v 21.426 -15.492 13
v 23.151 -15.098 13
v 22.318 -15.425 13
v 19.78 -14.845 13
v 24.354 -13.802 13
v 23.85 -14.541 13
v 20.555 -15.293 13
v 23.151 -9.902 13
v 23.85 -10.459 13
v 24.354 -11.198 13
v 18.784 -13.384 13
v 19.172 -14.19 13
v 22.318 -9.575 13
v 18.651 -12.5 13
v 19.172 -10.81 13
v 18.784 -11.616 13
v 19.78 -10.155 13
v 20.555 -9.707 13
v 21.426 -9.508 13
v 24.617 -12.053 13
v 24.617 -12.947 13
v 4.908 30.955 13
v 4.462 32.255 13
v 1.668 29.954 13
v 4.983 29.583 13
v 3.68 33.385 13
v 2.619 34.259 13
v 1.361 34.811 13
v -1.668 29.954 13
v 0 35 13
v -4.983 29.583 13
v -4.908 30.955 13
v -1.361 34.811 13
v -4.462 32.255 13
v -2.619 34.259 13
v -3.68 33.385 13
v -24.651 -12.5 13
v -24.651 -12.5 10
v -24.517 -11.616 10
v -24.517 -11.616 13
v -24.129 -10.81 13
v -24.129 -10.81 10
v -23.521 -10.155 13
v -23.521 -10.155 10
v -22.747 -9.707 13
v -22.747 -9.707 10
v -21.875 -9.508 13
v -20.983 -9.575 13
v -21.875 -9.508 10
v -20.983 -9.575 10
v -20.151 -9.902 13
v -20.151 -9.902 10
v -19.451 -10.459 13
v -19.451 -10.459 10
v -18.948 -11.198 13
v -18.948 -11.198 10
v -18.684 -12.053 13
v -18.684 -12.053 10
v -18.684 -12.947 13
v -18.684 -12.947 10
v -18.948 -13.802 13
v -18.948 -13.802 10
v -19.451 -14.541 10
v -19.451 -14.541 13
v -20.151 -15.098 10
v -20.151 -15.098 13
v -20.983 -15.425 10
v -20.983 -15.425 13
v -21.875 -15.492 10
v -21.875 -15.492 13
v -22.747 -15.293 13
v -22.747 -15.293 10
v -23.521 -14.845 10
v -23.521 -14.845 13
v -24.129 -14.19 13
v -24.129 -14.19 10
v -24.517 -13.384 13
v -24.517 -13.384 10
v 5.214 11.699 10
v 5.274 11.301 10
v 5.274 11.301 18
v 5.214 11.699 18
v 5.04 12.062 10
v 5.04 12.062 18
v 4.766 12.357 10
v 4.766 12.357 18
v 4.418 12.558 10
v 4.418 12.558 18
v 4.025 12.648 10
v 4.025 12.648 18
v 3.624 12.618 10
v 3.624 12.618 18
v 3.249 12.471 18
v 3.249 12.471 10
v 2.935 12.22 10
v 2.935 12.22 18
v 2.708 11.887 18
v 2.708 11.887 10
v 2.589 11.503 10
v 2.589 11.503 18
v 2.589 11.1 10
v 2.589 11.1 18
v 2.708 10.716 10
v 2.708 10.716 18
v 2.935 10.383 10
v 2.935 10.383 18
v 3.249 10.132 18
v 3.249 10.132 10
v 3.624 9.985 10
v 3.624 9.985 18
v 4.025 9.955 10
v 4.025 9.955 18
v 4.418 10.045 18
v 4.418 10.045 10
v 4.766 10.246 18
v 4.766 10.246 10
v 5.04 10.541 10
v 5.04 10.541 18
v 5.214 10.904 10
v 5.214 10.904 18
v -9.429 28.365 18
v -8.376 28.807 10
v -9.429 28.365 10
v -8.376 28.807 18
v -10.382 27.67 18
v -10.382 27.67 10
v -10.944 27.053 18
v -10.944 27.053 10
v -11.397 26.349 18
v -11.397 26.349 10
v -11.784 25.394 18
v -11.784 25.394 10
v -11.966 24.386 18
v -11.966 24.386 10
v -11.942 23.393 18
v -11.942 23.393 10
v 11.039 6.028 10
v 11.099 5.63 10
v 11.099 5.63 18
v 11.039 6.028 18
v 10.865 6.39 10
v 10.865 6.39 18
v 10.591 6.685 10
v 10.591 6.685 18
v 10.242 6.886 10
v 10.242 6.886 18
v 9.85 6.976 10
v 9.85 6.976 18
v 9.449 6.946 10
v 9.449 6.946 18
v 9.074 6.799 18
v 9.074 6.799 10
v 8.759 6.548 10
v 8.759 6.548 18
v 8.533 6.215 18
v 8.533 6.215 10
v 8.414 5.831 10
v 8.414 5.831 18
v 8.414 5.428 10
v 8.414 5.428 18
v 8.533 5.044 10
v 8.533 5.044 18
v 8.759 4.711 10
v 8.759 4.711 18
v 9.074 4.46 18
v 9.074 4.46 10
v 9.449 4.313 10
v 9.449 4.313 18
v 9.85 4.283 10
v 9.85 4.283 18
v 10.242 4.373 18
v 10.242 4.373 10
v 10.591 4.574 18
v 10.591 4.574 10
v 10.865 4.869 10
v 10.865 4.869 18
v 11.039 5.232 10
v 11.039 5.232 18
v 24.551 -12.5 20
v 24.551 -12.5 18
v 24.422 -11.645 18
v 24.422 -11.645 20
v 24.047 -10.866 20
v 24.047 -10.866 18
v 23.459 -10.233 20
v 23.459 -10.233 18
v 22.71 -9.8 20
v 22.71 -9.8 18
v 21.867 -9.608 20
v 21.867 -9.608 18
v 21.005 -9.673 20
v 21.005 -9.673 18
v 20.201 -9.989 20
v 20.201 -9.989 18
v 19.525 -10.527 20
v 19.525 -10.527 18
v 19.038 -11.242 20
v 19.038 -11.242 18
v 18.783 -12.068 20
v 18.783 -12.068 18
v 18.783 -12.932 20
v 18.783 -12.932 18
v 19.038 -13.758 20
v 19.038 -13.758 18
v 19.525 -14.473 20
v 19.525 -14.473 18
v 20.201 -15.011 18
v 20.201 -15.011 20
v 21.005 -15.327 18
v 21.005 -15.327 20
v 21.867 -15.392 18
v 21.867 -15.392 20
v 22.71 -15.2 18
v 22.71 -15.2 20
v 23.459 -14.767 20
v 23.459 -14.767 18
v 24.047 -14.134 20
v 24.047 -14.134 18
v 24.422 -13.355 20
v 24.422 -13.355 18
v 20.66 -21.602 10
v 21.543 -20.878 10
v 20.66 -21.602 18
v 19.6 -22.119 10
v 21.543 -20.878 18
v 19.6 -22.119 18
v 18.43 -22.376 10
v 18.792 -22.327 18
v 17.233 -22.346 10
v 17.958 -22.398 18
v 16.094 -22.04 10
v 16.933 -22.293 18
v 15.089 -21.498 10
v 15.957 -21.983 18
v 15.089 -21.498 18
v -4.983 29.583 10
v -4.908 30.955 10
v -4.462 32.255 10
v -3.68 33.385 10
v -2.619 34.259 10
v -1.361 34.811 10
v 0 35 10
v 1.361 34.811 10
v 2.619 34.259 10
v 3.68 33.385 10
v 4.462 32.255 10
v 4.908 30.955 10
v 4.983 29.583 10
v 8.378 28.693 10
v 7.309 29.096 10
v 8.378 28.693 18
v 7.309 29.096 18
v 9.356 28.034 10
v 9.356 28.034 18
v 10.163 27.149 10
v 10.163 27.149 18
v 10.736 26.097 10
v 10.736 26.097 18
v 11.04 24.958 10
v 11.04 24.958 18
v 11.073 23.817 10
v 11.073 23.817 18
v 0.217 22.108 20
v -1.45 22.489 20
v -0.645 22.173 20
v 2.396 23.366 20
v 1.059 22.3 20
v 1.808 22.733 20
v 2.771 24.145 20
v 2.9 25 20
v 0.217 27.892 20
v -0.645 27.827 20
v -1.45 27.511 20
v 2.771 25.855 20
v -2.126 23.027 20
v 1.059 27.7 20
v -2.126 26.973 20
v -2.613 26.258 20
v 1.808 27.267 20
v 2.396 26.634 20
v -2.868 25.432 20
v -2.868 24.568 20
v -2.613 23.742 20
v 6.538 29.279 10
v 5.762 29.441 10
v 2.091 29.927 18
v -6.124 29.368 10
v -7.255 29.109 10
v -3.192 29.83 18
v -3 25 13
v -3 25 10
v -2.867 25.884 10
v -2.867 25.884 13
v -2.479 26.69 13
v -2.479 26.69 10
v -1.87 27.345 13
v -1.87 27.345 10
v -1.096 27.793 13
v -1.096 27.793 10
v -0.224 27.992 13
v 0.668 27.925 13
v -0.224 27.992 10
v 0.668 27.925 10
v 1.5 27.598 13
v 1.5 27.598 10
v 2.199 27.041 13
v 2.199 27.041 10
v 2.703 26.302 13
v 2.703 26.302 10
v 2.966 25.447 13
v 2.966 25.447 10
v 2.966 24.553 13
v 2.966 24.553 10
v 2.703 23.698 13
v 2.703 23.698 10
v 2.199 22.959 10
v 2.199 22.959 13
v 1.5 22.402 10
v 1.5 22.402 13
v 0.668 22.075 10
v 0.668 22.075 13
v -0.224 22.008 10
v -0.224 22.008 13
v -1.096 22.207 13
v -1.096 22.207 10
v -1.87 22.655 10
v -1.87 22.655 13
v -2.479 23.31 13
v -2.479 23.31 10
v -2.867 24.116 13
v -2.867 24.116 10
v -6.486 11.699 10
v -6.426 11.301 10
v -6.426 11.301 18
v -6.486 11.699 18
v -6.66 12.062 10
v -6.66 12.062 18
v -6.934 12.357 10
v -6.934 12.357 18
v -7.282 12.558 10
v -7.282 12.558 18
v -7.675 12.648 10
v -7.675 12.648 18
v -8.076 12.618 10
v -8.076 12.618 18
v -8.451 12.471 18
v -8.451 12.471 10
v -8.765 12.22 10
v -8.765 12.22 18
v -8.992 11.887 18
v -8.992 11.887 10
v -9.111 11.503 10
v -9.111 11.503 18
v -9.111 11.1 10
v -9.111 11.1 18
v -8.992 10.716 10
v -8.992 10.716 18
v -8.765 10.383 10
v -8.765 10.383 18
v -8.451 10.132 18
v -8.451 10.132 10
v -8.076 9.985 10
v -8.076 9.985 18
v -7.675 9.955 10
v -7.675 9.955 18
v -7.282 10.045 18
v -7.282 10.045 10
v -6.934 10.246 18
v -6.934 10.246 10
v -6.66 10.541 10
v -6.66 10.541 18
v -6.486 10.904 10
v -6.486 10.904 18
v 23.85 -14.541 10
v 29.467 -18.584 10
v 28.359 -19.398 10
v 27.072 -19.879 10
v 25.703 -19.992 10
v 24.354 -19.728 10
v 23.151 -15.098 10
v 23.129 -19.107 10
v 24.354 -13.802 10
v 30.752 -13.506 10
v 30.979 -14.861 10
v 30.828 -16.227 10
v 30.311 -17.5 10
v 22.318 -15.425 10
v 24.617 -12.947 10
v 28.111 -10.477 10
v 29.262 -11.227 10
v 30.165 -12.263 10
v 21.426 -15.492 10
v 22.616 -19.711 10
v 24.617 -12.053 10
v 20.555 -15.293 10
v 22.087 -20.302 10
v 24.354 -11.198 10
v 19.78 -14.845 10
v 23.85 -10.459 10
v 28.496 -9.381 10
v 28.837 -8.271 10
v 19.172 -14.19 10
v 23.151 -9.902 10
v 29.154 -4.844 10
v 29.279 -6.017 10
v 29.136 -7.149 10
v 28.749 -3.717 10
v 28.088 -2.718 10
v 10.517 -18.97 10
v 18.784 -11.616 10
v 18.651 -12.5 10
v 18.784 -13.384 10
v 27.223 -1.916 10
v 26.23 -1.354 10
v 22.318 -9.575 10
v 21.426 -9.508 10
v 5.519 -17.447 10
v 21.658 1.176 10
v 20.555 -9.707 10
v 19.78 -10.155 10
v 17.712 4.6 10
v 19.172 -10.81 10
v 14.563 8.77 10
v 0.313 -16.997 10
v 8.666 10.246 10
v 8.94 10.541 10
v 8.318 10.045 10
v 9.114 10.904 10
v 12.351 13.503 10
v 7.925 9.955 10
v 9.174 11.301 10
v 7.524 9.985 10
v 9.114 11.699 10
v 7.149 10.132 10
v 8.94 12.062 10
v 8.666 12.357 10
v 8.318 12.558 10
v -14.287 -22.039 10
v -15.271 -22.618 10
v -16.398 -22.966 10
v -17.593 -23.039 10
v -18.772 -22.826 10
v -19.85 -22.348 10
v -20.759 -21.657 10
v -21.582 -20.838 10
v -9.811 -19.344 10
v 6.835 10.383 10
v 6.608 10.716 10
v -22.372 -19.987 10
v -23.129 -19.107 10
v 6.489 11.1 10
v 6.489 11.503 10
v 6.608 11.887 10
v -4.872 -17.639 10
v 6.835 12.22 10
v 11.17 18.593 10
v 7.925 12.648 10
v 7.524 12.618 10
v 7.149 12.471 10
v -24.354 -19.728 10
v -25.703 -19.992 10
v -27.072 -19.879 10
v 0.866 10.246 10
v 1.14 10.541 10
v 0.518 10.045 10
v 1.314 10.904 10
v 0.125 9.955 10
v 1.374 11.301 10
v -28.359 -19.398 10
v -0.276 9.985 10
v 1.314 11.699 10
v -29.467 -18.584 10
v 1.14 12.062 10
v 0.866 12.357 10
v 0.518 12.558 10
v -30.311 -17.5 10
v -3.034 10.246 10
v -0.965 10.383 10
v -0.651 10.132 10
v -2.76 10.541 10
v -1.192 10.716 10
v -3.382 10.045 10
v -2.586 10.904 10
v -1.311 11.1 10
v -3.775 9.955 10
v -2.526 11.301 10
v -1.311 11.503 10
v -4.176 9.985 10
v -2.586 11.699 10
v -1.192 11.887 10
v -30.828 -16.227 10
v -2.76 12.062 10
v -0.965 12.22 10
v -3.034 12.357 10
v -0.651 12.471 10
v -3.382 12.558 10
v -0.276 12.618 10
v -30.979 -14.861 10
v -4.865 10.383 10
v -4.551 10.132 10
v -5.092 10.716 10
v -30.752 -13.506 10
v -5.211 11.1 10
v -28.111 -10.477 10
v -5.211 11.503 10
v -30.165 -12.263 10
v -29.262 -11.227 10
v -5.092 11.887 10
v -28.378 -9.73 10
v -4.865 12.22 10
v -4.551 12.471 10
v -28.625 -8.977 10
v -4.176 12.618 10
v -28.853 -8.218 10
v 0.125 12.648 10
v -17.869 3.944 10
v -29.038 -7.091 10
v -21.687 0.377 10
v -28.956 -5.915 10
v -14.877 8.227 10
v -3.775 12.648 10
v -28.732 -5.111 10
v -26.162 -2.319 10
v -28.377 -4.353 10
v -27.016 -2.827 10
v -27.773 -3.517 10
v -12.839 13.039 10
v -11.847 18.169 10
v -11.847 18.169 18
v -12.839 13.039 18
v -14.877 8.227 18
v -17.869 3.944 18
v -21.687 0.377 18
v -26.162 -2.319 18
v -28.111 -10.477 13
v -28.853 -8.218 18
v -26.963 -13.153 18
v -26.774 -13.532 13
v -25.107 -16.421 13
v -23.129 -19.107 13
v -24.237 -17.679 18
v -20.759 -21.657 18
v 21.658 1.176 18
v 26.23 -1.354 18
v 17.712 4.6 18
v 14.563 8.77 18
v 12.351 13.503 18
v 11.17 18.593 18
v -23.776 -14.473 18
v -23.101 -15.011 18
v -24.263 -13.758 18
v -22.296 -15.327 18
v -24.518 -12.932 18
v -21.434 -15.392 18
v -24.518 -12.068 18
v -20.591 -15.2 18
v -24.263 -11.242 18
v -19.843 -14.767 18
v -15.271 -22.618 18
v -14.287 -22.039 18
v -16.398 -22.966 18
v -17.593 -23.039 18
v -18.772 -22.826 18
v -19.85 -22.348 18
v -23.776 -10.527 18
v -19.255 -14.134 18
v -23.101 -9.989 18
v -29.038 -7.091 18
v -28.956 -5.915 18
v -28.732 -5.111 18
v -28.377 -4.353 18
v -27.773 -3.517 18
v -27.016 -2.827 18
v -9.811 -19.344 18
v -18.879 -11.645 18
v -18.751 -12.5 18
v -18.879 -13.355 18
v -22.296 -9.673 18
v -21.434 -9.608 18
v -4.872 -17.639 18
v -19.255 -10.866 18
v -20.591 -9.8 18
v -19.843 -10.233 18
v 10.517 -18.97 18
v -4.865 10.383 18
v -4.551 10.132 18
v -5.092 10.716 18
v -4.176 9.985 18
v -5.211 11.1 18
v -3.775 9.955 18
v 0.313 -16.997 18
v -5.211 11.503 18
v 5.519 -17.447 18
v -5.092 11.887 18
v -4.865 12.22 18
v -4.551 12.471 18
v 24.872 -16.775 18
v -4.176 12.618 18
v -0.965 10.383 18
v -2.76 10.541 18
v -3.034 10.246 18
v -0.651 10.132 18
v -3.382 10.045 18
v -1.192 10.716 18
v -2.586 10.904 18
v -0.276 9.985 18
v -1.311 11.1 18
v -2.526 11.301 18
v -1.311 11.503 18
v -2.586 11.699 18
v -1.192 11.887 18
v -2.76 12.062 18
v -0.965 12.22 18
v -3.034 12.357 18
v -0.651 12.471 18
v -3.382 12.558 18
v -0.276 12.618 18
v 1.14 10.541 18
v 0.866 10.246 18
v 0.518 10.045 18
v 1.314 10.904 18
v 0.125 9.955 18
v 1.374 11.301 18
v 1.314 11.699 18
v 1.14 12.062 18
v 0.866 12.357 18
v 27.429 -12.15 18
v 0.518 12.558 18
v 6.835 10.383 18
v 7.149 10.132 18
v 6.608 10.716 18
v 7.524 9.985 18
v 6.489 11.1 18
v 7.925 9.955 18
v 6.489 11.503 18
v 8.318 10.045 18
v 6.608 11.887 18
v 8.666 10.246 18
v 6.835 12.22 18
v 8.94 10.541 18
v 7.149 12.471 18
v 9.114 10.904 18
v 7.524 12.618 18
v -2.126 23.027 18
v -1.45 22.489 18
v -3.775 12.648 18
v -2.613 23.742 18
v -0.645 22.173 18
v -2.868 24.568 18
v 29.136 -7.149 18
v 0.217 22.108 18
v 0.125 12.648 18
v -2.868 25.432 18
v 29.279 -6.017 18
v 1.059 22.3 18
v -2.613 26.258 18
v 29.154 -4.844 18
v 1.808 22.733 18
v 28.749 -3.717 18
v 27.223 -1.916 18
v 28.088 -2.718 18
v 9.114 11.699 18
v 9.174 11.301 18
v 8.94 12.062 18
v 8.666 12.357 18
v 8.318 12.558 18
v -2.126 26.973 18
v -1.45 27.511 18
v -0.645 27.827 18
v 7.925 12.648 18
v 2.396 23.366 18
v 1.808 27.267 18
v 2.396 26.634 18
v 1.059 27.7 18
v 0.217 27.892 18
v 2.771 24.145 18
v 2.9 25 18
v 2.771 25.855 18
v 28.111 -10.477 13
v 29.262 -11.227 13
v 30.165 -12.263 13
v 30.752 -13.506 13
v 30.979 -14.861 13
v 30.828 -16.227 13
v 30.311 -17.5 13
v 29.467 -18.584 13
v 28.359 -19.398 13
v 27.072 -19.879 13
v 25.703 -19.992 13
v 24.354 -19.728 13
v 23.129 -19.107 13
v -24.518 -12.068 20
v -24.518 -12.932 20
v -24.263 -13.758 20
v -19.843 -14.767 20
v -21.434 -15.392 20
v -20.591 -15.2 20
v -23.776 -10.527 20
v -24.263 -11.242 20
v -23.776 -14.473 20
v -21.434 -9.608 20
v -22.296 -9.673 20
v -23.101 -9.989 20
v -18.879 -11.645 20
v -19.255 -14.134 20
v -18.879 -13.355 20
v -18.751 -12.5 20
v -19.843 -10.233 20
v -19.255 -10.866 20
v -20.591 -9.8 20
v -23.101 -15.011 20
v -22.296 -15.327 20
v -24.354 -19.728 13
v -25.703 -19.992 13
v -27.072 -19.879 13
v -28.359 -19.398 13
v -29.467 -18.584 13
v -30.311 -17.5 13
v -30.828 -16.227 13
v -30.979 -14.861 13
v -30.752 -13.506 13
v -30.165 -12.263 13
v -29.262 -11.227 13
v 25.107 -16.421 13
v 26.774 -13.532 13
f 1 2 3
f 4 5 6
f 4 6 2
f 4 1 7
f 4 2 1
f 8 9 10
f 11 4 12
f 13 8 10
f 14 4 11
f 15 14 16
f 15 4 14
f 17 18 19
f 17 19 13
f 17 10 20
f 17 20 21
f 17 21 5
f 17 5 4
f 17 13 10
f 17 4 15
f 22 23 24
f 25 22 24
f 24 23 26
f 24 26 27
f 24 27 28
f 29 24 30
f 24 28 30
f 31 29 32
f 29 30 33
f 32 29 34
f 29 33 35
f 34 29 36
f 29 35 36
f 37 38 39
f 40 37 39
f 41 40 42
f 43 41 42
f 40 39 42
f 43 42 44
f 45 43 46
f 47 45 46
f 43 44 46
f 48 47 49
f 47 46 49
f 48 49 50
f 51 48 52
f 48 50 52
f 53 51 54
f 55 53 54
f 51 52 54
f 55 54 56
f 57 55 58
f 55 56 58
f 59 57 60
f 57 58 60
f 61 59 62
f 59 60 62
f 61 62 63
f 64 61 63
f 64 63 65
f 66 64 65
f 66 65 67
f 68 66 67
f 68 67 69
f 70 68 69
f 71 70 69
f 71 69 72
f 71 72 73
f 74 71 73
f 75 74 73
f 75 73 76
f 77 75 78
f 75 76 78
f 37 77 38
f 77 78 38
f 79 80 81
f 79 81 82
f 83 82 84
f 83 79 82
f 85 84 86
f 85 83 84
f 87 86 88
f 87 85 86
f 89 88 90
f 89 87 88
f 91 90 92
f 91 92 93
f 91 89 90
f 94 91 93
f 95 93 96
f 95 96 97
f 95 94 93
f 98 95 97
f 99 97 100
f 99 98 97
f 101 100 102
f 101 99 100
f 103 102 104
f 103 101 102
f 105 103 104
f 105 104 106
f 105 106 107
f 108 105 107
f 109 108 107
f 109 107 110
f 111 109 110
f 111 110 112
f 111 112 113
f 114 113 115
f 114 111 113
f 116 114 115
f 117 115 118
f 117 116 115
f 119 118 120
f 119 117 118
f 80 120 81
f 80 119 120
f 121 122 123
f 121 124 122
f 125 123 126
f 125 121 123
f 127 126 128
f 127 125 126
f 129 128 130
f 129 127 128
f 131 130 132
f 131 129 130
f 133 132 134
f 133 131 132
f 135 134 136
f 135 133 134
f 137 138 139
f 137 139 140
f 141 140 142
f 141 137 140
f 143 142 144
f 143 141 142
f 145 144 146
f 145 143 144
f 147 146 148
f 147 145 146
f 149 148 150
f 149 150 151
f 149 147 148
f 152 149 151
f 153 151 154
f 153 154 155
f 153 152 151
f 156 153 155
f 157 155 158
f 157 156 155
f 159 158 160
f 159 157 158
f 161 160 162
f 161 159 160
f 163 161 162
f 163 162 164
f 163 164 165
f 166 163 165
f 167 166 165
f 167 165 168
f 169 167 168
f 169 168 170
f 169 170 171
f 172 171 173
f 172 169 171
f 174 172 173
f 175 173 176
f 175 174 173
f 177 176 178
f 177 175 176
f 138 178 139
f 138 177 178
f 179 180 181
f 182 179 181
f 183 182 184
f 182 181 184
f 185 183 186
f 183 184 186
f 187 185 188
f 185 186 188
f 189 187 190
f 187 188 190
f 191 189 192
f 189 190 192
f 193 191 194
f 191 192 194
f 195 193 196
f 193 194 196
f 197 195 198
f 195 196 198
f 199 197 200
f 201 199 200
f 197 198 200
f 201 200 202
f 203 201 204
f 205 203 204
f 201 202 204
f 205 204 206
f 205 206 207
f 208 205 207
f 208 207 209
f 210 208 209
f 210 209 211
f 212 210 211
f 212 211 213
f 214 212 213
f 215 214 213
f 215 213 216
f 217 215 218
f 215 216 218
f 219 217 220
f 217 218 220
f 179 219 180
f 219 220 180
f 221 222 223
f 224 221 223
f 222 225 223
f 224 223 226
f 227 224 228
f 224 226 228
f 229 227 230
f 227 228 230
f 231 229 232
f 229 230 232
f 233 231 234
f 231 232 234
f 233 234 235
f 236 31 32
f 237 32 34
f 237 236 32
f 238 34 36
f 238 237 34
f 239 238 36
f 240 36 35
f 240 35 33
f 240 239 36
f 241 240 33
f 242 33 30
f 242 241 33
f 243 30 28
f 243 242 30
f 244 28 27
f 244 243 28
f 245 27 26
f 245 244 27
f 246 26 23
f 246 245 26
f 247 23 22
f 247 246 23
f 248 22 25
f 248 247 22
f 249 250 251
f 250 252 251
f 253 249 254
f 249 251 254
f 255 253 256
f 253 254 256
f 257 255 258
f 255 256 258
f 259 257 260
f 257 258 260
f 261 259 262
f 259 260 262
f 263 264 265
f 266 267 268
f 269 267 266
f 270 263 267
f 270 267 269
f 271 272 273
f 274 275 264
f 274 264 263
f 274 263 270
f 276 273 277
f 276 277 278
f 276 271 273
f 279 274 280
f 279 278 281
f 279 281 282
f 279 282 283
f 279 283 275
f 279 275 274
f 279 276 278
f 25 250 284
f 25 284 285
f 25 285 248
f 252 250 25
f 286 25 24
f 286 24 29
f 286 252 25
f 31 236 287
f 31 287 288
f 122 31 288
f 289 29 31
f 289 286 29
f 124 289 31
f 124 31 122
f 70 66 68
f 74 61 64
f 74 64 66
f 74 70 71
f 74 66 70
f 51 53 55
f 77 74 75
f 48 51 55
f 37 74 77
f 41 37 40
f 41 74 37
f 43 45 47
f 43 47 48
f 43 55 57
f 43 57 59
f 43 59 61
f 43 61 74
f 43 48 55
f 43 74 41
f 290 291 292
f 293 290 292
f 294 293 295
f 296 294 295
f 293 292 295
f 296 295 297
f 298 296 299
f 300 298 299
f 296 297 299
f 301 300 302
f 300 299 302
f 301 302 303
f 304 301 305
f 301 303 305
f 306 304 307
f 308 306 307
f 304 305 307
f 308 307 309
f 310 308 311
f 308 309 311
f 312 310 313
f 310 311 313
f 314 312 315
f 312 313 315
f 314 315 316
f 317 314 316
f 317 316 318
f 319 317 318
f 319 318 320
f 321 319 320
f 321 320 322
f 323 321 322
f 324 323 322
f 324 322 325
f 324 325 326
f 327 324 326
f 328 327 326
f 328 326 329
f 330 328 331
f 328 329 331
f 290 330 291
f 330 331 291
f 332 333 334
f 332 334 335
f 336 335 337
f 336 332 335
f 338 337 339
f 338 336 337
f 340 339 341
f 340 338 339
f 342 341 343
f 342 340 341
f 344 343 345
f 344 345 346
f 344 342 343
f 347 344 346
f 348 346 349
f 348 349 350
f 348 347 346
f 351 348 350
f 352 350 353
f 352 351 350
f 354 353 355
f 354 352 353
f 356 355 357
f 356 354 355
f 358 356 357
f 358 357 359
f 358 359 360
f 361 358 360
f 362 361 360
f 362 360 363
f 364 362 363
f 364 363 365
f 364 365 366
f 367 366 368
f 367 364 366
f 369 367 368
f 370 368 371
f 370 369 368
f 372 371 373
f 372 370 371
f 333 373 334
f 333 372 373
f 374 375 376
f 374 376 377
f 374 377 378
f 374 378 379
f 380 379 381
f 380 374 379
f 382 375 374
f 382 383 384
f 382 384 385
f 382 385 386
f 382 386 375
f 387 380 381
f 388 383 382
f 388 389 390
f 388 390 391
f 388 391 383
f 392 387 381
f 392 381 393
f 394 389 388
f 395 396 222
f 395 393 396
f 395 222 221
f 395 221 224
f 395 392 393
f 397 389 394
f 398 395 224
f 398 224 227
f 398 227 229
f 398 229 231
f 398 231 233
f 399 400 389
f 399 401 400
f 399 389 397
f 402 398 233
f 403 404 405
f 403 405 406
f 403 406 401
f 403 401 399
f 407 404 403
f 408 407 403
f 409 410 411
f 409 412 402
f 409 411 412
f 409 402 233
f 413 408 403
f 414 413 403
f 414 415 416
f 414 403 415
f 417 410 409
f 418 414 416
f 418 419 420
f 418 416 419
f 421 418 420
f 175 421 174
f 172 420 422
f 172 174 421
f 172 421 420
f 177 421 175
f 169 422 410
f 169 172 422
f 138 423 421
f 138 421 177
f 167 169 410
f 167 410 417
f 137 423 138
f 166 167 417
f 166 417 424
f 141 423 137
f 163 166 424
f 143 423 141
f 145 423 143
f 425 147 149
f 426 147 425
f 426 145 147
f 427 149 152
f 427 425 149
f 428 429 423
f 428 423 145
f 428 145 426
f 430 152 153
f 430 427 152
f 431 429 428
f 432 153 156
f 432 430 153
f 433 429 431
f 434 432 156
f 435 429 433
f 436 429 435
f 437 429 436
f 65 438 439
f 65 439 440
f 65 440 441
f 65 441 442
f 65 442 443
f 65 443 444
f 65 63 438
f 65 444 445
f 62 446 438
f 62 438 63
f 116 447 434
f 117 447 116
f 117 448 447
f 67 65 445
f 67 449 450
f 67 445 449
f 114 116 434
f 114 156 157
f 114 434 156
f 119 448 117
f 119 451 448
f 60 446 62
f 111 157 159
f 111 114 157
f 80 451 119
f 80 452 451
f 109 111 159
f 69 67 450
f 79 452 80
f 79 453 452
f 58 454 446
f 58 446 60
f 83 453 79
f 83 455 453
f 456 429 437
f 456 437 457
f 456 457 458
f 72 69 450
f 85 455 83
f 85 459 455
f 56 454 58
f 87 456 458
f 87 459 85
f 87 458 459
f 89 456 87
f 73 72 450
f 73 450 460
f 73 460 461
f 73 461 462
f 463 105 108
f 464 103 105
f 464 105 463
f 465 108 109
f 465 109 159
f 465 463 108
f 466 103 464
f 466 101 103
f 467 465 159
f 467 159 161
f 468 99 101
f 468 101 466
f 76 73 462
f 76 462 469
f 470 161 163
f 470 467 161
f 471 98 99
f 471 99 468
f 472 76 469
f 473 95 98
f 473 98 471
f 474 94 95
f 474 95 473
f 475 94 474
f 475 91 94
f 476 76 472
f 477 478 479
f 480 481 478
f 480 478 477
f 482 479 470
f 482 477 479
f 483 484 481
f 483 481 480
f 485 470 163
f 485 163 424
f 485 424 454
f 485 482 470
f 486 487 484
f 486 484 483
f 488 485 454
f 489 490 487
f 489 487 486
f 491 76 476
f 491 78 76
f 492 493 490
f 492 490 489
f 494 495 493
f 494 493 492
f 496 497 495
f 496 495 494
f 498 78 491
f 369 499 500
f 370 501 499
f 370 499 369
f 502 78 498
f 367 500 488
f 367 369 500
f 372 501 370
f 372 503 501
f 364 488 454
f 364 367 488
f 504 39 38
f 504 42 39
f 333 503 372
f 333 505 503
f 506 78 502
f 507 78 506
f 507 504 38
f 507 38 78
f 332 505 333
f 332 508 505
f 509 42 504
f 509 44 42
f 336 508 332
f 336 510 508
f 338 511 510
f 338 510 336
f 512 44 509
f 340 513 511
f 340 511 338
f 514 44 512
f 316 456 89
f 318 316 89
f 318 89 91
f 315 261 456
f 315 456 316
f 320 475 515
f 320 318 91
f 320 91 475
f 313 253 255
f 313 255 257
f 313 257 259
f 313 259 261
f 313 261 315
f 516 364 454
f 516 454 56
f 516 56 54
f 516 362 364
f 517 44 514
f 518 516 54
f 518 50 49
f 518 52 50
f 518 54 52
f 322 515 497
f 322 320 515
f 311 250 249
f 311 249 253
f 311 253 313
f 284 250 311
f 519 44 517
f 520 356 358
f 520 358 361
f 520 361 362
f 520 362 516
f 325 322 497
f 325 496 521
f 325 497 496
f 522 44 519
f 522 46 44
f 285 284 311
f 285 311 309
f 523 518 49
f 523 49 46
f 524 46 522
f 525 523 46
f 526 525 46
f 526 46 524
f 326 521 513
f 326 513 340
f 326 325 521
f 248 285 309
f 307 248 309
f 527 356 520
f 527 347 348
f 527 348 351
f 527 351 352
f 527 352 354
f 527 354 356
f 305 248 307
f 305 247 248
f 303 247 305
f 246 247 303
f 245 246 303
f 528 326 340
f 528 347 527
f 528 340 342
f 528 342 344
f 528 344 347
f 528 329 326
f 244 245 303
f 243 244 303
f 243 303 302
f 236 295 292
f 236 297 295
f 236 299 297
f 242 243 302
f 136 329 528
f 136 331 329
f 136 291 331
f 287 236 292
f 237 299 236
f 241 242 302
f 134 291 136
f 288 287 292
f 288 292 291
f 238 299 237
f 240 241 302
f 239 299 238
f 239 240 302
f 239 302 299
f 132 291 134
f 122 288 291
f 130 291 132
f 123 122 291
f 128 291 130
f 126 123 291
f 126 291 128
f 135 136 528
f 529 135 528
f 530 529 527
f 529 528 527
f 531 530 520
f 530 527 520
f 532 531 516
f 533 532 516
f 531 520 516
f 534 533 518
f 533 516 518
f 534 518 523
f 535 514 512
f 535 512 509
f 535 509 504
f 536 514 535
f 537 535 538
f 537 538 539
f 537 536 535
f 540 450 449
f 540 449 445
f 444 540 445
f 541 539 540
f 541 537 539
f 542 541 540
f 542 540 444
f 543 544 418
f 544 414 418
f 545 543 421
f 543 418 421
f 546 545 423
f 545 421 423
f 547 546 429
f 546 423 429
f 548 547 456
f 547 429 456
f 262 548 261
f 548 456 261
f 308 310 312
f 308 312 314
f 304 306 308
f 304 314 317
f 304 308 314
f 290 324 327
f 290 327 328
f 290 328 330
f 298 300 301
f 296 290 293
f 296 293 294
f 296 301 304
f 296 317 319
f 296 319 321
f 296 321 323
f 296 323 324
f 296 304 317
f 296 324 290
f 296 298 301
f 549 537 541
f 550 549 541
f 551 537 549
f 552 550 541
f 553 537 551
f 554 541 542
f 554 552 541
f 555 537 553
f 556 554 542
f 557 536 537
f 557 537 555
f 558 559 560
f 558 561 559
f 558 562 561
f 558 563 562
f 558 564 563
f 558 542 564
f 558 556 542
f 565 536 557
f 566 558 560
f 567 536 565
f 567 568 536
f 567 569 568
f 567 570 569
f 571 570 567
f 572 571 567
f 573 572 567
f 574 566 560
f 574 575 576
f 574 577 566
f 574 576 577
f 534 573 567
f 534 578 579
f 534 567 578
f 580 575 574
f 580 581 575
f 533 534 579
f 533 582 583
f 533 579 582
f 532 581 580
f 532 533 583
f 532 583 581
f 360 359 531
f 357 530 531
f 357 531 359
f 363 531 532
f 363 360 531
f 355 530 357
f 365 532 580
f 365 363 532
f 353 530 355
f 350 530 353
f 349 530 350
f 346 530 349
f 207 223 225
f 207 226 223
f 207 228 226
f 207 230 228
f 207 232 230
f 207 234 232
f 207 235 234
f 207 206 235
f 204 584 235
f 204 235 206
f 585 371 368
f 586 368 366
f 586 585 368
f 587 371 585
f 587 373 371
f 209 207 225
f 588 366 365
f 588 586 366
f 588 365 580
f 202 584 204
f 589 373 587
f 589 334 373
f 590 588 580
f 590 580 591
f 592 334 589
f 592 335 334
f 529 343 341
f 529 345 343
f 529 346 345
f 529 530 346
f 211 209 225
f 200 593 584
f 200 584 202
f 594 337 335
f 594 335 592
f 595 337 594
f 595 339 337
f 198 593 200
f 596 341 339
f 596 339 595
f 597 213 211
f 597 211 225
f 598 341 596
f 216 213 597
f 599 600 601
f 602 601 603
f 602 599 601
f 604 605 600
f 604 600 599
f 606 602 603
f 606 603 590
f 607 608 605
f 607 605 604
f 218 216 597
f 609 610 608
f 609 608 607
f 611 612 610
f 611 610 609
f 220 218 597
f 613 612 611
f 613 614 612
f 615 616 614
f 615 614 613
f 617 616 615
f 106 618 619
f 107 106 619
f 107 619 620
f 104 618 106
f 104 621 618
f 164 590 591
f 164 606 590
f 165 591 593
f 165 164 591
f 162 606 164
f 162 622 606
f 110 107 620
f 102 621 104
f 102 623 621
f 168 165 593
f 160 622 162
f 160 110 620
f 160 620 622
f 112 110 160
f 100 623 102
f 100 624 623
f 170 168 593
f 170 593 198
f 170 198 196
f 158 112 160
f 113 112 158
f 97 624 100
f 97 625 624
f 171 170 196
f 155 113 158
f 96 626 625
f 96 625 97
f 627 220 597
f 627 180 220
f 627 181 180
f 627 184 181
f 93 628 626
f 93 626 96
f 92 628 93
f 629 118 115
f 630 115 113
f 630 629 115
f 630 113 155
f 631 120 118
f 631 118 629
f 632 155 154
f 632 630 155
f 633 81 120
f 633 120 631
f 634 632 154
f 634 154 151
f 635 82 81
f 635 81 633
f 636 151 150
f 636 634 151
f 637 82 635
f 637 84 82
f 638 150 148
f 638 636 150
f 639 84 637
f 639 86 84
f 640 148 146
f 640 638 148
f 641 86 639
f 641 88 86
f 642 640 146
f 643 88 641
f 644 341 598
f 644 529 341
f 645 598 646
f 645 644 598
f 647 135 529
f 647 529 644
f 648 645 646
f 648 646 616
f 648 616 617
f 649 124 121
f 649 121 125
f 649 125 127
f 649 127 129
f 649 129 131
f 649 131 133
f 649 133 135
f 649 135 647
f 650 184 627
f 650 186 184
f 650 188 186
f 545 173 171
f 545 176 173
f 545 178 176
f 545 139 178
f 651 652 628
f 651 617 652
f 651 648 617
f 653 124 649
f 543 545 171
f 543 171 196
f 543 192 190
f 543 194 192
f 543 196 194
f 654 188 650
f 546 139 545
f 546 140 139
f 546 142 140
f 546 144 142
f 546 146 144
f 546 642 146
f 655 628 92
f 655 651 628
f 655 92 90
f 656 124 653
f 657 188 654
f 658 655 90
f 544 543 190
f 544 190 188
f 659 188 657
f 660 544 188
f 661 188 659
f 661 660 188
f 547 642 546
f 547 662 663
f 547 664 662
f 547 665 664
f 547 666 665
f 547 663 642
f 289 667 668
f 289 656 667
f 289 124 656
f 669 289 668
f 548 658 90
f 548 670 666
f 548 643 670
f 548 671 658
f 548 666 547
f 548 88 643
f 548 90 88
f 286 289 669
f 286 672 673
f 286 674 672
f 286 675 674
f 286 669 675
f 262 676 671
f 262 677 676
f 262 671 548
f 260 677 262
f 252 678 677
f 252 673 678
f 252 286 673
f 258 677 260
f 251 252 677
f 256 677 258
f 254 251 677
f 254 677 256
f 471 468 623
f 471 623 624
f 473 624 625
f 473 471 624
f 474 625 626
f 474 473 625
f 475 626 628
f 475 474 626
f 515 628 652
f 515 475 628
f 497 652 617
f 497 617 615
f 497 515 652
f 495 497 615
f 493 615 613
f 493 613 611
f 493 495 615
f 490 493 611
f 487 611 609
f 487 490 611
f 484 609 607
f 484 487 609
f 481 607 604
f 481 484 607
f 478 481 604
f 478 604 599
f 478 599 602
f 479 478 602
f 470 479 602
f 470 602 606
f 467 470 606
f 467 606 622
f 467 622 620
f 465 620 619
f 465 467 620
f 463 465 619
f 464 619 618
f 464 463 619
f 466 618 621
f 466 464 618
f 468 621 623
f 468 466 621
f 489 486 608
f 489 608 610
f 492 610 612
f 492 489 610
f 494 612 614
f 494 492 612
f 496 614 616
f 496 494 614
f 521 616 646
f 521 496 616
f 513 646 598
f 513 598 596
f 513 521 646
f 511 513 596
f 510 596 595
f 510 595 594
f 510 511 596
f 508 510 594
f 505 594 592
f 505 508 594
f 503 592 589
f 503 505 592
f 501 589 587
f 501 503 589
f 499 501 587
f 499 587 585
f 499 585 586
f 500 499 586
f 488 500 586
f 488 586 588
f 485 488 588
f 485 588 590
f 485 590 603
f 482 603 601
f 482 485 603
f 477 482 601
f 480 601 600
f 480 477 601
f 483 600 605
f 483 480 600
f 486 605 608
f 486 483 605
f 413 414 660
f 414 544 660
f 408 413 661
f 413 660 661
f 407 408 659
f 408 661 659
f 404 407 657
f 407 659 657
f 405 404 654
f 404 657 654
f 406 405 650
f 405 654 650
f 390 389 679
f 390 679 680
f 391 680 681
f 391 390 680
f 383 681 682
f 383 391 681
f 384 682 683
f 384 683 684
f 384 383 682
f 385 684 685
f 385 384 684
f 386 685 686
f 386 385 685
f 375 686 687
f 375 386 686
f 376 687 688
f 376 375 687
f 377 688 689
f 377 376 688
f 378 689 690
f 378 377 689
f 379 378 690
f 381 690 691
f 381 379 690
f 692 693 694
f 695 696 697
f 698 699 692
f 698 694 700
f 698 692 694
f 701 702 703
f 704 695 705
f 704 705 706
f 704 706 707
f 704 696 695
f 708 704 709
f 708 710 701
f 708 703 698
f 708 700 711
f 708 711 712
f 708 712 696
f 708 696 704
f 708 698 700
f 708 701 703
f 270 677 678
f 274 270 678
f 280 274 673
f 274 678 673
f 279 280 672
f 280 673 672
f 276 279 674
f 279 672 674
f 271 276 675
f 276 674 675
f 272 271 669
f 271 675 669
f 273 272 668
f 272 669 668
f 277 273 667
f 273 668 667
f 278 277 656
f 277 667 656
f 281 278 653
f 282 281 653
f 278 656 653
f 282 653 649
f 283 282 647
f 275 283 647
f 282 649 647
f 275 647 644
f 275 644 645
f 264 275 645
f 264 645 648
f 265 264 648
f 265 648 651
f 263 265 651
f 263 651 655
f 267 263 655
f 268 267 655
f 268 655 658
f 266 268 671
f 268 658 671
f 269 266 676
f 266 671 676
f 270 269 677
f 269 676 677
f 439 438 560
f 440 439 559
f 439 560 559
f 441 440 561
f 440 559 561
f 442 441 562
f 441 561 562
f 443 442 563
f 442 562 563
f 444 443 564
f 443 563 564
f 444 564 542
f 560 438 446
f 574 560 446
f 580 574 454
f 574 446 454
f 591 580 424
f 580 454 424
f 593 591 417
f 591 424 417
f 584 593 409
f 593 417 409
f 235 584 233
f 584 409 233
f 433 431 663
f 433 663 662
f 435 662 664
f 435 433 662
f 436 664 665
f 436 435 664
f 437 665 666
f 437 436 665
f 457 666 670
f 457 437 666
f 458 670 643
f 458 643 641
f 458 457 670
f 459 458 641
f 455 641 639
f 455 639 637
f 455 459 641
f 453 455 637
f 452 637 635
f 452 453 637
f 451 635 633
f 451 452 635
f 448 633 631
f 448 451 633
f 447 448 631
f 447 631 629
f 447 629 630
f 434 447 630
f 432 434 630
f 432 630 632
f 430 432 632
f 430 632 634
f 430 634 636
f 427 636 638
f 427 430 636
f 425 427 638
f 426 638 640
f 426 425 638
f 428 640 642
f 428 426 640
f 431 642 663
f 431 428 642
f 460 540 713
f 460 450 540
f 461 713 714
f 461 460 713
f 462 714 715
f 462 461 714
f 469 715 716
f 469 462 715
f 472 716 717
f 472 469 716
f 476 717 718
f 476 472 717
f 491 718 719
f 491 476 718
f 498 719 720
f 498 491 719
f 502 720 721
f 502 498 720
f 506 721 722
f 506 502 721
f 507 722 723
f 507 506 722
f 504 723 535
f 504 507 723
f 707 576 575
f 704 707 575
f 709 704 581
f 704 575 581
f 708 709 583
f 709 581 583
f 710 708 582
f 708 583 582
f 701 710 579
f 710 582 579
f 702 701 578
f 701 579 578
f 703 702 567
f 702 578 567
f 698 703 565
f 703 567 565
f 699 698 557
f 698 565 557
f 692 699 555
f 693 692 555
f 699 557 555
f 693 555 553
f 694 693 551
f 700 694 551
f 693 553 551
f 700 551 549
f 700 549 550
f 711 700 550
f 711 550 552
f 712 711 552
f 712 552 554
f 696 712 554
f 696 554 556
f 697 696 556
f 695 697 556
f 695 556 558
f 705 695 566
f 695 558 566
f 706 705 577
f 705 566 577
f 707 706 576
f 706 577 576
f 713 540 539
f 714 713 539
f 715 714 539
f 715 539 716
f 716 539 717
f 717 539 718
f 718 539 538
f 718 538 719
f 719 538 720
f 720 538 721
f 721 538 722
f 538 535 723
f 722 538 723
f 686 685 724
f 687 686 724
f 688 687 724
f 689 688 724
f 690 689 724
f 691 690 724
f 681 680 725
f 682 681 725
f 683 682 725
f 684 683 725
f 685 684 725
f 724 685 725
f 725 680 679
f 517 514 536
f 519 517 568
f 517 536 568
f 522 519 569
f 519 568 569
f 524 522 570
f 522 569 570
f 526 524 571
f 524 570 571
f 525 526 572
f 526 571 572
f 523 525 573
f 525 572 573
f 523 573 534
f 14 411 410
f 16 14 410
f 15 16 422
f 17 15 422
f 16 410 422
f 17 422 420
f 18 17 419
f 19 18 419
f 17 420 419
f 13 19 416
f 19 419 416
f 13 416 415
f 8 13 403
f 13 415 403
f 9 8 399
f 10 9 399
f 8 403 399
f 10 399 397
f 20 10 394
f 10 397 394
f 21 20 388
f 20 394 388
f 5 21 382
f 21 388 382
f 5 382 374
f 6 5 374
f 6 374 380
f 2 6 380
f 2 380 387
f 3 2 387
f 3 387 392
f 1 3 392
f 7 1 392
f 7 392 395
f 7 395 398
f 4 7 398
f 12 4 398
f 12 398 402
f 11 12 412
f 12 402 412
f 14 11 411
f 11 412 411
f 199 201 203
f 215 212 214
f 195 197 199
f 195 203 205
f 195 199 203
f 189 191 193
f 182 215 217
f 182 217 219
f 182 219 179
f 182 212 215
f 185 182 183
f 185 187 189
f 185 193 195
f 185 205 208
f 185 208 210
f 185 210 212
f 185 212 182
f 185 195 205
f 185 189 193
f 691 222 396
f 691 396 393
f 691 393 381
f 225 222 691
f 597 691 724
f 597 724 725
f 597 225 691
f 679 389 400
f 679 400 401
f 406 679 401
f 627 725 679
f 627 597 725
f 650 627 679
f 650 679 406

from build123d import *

# Parameters (mm, degrees)
SKETCH2_R           = 18.85
SKETCH2_R_2         = 1.350069841
BOSS_EXTRUDE1_DEPTH = 8
SKETCH3_R           = 30
SKETCH3_R_2         = 17.600030795
BOSS_EXTRUDE2_DEPTH = 8
SKETCH4_R           = 2.9
BOSS_EXTRUDE3_DEPTH = 2
SKETCH6_R           = 5
BOSS_EXTRUDE4_DEPTH = 3
SKETCH5_R           = 3
CUT_EXTRUDE1_DEPTH  = 3
SKETCH7_R           = 25
CUT_EXTRUDE2_DEPTH  = 8
FILLET1_R           = 5


with BuildPart() as part:
    # Sketch2 → Boss-Extrude1 (new body)
    with BuildSketch(Plane.XY.offset(10)):
        Circle(SKETCH2_R)
        with Locations((7.824268806, 11.301452471)):
            Circle(SKETCH2_R_2, mode=Mode.SUBTRACT)
        with Locations((3.924268806, 11.301452471)):
            Circle(SKETCH2_R_2, mode=Mode.SUBTRACT)
        with Locations((0.024268806, 11.301452471)):
            Circle(SKETCH2_R_2, mode=Mode.SUBTRACT)
        with Locations((-3.875731194, 11.301452471)):
            Circle(SKETCH2_R_2, mode=Mode.SUBTRACT)
        with Locations((-7.775731194, 11.301452471)):
            Circle(SKETCH2_R_2, mode=Mode.SUBTRACT)
        with Locations((9.749100056, 5.629684708)):
            Circle(SKETCH2_R_2, mode=Mode.SUBTRACT)
    extrude(amount=BOSS_EXTRUDE1_DEPTH)

    # Sketch3 → Boss-Extrude2 (add)
    with BuildSketch(Plane.XY.offset(18)):
        Circle(SKETCH3_R)
        Circle(SKETCH3_R_2, mode=Mode.SUBTRACT)
    extrude(amount=-BOSS_EXTRUDE2_DEPTH)

    # Sketch4 → Boss-Extrude3 (add)
    with BuildSketch(Plane.XY.offset(18)):
        with Locations((0, 25)):
            Circle(SKETCH4_R)
        with Locations((21.650635095, -12.5)):
            Circle(SKETCH4_R)
        with Locations((-21.650635095, -12.5)):
            Circle(SKETCH4_R)
    extrude(amount=BOSS_EXTRUDE3_DEPTH)

    # Sketch6 → Boss-Extrude4 (add)
    with BuildSketch(Plane(origin=(0, 0, 10), x_dir=(-1, 0, 0), z_dir=(0, 0, -1))):
        with Locations((0, 30)):
            Circle(SKETCH6_R)
        with Locations((25.980762114, -15)):
            Circle(SKETCH6_R)
        with Locations((-25.980762114, -15)):
            Circle(SKETCH6_R)
    extrude(amount=-BOSS_EXTRUDE4_DEPTH)

    # Sketch5 → Cut-Extrude1 (cut)
    with BuildSketch(Plane(origin=(0, 0, 10), x_dir=(-1, 0, 0), z_dir=(0, 0, -1))):
        with Locations((0, 25)):
            Circle(SKETCH5_R)
        with Locations((21.650635095, -12.5)):
            Circle(SKETCH5_R)
        with Locations((-21.650635095, -12.5)):
            Circle(SKETCH5_R)
    extrude(amount=-CUT_EXTRUDE1_DEPTH, mode=Mode.SUBTRACT)

    # Sketch7 → Cut-Extrude2 (cut)
    with BuildSketch(Plane(origin=(0, 0, 10), x_dir=(-1, 0, 0), z_dir=(0, 0, -1))):
        with Locations((-35.980083702, 21.666415873)):
            Circle(SKETCH7_R)
        with Locations((36.753708406, 20.32645858)):
            Circle(SKETCH7_R)
        with Locations((-0.773624703, -41.992874453)):
            Circle(SKETCH7_R)
    extrude(amount=-CUT_EXTRUDE2_DEPTH, mode=Mode.SUBTRACT)

    # Fillet1
    fillet1_edges = [part.edges().sort_by_distance(p)[0] for p in [
        (29.888839754, -2.580166302, 14),
        (11.700383981, 27.624283062, 14),
        (-12.709930313, 27.174577668, 14),
        (-29.773522884, -3.679311769, 14),
        (-17.178909441, -24.594411366, 14),
        (18.073138902, -23.944971293, 14),
    ]]
    fillet(fillet1_edges, radius=FILLET1_R)


solid = part.part
